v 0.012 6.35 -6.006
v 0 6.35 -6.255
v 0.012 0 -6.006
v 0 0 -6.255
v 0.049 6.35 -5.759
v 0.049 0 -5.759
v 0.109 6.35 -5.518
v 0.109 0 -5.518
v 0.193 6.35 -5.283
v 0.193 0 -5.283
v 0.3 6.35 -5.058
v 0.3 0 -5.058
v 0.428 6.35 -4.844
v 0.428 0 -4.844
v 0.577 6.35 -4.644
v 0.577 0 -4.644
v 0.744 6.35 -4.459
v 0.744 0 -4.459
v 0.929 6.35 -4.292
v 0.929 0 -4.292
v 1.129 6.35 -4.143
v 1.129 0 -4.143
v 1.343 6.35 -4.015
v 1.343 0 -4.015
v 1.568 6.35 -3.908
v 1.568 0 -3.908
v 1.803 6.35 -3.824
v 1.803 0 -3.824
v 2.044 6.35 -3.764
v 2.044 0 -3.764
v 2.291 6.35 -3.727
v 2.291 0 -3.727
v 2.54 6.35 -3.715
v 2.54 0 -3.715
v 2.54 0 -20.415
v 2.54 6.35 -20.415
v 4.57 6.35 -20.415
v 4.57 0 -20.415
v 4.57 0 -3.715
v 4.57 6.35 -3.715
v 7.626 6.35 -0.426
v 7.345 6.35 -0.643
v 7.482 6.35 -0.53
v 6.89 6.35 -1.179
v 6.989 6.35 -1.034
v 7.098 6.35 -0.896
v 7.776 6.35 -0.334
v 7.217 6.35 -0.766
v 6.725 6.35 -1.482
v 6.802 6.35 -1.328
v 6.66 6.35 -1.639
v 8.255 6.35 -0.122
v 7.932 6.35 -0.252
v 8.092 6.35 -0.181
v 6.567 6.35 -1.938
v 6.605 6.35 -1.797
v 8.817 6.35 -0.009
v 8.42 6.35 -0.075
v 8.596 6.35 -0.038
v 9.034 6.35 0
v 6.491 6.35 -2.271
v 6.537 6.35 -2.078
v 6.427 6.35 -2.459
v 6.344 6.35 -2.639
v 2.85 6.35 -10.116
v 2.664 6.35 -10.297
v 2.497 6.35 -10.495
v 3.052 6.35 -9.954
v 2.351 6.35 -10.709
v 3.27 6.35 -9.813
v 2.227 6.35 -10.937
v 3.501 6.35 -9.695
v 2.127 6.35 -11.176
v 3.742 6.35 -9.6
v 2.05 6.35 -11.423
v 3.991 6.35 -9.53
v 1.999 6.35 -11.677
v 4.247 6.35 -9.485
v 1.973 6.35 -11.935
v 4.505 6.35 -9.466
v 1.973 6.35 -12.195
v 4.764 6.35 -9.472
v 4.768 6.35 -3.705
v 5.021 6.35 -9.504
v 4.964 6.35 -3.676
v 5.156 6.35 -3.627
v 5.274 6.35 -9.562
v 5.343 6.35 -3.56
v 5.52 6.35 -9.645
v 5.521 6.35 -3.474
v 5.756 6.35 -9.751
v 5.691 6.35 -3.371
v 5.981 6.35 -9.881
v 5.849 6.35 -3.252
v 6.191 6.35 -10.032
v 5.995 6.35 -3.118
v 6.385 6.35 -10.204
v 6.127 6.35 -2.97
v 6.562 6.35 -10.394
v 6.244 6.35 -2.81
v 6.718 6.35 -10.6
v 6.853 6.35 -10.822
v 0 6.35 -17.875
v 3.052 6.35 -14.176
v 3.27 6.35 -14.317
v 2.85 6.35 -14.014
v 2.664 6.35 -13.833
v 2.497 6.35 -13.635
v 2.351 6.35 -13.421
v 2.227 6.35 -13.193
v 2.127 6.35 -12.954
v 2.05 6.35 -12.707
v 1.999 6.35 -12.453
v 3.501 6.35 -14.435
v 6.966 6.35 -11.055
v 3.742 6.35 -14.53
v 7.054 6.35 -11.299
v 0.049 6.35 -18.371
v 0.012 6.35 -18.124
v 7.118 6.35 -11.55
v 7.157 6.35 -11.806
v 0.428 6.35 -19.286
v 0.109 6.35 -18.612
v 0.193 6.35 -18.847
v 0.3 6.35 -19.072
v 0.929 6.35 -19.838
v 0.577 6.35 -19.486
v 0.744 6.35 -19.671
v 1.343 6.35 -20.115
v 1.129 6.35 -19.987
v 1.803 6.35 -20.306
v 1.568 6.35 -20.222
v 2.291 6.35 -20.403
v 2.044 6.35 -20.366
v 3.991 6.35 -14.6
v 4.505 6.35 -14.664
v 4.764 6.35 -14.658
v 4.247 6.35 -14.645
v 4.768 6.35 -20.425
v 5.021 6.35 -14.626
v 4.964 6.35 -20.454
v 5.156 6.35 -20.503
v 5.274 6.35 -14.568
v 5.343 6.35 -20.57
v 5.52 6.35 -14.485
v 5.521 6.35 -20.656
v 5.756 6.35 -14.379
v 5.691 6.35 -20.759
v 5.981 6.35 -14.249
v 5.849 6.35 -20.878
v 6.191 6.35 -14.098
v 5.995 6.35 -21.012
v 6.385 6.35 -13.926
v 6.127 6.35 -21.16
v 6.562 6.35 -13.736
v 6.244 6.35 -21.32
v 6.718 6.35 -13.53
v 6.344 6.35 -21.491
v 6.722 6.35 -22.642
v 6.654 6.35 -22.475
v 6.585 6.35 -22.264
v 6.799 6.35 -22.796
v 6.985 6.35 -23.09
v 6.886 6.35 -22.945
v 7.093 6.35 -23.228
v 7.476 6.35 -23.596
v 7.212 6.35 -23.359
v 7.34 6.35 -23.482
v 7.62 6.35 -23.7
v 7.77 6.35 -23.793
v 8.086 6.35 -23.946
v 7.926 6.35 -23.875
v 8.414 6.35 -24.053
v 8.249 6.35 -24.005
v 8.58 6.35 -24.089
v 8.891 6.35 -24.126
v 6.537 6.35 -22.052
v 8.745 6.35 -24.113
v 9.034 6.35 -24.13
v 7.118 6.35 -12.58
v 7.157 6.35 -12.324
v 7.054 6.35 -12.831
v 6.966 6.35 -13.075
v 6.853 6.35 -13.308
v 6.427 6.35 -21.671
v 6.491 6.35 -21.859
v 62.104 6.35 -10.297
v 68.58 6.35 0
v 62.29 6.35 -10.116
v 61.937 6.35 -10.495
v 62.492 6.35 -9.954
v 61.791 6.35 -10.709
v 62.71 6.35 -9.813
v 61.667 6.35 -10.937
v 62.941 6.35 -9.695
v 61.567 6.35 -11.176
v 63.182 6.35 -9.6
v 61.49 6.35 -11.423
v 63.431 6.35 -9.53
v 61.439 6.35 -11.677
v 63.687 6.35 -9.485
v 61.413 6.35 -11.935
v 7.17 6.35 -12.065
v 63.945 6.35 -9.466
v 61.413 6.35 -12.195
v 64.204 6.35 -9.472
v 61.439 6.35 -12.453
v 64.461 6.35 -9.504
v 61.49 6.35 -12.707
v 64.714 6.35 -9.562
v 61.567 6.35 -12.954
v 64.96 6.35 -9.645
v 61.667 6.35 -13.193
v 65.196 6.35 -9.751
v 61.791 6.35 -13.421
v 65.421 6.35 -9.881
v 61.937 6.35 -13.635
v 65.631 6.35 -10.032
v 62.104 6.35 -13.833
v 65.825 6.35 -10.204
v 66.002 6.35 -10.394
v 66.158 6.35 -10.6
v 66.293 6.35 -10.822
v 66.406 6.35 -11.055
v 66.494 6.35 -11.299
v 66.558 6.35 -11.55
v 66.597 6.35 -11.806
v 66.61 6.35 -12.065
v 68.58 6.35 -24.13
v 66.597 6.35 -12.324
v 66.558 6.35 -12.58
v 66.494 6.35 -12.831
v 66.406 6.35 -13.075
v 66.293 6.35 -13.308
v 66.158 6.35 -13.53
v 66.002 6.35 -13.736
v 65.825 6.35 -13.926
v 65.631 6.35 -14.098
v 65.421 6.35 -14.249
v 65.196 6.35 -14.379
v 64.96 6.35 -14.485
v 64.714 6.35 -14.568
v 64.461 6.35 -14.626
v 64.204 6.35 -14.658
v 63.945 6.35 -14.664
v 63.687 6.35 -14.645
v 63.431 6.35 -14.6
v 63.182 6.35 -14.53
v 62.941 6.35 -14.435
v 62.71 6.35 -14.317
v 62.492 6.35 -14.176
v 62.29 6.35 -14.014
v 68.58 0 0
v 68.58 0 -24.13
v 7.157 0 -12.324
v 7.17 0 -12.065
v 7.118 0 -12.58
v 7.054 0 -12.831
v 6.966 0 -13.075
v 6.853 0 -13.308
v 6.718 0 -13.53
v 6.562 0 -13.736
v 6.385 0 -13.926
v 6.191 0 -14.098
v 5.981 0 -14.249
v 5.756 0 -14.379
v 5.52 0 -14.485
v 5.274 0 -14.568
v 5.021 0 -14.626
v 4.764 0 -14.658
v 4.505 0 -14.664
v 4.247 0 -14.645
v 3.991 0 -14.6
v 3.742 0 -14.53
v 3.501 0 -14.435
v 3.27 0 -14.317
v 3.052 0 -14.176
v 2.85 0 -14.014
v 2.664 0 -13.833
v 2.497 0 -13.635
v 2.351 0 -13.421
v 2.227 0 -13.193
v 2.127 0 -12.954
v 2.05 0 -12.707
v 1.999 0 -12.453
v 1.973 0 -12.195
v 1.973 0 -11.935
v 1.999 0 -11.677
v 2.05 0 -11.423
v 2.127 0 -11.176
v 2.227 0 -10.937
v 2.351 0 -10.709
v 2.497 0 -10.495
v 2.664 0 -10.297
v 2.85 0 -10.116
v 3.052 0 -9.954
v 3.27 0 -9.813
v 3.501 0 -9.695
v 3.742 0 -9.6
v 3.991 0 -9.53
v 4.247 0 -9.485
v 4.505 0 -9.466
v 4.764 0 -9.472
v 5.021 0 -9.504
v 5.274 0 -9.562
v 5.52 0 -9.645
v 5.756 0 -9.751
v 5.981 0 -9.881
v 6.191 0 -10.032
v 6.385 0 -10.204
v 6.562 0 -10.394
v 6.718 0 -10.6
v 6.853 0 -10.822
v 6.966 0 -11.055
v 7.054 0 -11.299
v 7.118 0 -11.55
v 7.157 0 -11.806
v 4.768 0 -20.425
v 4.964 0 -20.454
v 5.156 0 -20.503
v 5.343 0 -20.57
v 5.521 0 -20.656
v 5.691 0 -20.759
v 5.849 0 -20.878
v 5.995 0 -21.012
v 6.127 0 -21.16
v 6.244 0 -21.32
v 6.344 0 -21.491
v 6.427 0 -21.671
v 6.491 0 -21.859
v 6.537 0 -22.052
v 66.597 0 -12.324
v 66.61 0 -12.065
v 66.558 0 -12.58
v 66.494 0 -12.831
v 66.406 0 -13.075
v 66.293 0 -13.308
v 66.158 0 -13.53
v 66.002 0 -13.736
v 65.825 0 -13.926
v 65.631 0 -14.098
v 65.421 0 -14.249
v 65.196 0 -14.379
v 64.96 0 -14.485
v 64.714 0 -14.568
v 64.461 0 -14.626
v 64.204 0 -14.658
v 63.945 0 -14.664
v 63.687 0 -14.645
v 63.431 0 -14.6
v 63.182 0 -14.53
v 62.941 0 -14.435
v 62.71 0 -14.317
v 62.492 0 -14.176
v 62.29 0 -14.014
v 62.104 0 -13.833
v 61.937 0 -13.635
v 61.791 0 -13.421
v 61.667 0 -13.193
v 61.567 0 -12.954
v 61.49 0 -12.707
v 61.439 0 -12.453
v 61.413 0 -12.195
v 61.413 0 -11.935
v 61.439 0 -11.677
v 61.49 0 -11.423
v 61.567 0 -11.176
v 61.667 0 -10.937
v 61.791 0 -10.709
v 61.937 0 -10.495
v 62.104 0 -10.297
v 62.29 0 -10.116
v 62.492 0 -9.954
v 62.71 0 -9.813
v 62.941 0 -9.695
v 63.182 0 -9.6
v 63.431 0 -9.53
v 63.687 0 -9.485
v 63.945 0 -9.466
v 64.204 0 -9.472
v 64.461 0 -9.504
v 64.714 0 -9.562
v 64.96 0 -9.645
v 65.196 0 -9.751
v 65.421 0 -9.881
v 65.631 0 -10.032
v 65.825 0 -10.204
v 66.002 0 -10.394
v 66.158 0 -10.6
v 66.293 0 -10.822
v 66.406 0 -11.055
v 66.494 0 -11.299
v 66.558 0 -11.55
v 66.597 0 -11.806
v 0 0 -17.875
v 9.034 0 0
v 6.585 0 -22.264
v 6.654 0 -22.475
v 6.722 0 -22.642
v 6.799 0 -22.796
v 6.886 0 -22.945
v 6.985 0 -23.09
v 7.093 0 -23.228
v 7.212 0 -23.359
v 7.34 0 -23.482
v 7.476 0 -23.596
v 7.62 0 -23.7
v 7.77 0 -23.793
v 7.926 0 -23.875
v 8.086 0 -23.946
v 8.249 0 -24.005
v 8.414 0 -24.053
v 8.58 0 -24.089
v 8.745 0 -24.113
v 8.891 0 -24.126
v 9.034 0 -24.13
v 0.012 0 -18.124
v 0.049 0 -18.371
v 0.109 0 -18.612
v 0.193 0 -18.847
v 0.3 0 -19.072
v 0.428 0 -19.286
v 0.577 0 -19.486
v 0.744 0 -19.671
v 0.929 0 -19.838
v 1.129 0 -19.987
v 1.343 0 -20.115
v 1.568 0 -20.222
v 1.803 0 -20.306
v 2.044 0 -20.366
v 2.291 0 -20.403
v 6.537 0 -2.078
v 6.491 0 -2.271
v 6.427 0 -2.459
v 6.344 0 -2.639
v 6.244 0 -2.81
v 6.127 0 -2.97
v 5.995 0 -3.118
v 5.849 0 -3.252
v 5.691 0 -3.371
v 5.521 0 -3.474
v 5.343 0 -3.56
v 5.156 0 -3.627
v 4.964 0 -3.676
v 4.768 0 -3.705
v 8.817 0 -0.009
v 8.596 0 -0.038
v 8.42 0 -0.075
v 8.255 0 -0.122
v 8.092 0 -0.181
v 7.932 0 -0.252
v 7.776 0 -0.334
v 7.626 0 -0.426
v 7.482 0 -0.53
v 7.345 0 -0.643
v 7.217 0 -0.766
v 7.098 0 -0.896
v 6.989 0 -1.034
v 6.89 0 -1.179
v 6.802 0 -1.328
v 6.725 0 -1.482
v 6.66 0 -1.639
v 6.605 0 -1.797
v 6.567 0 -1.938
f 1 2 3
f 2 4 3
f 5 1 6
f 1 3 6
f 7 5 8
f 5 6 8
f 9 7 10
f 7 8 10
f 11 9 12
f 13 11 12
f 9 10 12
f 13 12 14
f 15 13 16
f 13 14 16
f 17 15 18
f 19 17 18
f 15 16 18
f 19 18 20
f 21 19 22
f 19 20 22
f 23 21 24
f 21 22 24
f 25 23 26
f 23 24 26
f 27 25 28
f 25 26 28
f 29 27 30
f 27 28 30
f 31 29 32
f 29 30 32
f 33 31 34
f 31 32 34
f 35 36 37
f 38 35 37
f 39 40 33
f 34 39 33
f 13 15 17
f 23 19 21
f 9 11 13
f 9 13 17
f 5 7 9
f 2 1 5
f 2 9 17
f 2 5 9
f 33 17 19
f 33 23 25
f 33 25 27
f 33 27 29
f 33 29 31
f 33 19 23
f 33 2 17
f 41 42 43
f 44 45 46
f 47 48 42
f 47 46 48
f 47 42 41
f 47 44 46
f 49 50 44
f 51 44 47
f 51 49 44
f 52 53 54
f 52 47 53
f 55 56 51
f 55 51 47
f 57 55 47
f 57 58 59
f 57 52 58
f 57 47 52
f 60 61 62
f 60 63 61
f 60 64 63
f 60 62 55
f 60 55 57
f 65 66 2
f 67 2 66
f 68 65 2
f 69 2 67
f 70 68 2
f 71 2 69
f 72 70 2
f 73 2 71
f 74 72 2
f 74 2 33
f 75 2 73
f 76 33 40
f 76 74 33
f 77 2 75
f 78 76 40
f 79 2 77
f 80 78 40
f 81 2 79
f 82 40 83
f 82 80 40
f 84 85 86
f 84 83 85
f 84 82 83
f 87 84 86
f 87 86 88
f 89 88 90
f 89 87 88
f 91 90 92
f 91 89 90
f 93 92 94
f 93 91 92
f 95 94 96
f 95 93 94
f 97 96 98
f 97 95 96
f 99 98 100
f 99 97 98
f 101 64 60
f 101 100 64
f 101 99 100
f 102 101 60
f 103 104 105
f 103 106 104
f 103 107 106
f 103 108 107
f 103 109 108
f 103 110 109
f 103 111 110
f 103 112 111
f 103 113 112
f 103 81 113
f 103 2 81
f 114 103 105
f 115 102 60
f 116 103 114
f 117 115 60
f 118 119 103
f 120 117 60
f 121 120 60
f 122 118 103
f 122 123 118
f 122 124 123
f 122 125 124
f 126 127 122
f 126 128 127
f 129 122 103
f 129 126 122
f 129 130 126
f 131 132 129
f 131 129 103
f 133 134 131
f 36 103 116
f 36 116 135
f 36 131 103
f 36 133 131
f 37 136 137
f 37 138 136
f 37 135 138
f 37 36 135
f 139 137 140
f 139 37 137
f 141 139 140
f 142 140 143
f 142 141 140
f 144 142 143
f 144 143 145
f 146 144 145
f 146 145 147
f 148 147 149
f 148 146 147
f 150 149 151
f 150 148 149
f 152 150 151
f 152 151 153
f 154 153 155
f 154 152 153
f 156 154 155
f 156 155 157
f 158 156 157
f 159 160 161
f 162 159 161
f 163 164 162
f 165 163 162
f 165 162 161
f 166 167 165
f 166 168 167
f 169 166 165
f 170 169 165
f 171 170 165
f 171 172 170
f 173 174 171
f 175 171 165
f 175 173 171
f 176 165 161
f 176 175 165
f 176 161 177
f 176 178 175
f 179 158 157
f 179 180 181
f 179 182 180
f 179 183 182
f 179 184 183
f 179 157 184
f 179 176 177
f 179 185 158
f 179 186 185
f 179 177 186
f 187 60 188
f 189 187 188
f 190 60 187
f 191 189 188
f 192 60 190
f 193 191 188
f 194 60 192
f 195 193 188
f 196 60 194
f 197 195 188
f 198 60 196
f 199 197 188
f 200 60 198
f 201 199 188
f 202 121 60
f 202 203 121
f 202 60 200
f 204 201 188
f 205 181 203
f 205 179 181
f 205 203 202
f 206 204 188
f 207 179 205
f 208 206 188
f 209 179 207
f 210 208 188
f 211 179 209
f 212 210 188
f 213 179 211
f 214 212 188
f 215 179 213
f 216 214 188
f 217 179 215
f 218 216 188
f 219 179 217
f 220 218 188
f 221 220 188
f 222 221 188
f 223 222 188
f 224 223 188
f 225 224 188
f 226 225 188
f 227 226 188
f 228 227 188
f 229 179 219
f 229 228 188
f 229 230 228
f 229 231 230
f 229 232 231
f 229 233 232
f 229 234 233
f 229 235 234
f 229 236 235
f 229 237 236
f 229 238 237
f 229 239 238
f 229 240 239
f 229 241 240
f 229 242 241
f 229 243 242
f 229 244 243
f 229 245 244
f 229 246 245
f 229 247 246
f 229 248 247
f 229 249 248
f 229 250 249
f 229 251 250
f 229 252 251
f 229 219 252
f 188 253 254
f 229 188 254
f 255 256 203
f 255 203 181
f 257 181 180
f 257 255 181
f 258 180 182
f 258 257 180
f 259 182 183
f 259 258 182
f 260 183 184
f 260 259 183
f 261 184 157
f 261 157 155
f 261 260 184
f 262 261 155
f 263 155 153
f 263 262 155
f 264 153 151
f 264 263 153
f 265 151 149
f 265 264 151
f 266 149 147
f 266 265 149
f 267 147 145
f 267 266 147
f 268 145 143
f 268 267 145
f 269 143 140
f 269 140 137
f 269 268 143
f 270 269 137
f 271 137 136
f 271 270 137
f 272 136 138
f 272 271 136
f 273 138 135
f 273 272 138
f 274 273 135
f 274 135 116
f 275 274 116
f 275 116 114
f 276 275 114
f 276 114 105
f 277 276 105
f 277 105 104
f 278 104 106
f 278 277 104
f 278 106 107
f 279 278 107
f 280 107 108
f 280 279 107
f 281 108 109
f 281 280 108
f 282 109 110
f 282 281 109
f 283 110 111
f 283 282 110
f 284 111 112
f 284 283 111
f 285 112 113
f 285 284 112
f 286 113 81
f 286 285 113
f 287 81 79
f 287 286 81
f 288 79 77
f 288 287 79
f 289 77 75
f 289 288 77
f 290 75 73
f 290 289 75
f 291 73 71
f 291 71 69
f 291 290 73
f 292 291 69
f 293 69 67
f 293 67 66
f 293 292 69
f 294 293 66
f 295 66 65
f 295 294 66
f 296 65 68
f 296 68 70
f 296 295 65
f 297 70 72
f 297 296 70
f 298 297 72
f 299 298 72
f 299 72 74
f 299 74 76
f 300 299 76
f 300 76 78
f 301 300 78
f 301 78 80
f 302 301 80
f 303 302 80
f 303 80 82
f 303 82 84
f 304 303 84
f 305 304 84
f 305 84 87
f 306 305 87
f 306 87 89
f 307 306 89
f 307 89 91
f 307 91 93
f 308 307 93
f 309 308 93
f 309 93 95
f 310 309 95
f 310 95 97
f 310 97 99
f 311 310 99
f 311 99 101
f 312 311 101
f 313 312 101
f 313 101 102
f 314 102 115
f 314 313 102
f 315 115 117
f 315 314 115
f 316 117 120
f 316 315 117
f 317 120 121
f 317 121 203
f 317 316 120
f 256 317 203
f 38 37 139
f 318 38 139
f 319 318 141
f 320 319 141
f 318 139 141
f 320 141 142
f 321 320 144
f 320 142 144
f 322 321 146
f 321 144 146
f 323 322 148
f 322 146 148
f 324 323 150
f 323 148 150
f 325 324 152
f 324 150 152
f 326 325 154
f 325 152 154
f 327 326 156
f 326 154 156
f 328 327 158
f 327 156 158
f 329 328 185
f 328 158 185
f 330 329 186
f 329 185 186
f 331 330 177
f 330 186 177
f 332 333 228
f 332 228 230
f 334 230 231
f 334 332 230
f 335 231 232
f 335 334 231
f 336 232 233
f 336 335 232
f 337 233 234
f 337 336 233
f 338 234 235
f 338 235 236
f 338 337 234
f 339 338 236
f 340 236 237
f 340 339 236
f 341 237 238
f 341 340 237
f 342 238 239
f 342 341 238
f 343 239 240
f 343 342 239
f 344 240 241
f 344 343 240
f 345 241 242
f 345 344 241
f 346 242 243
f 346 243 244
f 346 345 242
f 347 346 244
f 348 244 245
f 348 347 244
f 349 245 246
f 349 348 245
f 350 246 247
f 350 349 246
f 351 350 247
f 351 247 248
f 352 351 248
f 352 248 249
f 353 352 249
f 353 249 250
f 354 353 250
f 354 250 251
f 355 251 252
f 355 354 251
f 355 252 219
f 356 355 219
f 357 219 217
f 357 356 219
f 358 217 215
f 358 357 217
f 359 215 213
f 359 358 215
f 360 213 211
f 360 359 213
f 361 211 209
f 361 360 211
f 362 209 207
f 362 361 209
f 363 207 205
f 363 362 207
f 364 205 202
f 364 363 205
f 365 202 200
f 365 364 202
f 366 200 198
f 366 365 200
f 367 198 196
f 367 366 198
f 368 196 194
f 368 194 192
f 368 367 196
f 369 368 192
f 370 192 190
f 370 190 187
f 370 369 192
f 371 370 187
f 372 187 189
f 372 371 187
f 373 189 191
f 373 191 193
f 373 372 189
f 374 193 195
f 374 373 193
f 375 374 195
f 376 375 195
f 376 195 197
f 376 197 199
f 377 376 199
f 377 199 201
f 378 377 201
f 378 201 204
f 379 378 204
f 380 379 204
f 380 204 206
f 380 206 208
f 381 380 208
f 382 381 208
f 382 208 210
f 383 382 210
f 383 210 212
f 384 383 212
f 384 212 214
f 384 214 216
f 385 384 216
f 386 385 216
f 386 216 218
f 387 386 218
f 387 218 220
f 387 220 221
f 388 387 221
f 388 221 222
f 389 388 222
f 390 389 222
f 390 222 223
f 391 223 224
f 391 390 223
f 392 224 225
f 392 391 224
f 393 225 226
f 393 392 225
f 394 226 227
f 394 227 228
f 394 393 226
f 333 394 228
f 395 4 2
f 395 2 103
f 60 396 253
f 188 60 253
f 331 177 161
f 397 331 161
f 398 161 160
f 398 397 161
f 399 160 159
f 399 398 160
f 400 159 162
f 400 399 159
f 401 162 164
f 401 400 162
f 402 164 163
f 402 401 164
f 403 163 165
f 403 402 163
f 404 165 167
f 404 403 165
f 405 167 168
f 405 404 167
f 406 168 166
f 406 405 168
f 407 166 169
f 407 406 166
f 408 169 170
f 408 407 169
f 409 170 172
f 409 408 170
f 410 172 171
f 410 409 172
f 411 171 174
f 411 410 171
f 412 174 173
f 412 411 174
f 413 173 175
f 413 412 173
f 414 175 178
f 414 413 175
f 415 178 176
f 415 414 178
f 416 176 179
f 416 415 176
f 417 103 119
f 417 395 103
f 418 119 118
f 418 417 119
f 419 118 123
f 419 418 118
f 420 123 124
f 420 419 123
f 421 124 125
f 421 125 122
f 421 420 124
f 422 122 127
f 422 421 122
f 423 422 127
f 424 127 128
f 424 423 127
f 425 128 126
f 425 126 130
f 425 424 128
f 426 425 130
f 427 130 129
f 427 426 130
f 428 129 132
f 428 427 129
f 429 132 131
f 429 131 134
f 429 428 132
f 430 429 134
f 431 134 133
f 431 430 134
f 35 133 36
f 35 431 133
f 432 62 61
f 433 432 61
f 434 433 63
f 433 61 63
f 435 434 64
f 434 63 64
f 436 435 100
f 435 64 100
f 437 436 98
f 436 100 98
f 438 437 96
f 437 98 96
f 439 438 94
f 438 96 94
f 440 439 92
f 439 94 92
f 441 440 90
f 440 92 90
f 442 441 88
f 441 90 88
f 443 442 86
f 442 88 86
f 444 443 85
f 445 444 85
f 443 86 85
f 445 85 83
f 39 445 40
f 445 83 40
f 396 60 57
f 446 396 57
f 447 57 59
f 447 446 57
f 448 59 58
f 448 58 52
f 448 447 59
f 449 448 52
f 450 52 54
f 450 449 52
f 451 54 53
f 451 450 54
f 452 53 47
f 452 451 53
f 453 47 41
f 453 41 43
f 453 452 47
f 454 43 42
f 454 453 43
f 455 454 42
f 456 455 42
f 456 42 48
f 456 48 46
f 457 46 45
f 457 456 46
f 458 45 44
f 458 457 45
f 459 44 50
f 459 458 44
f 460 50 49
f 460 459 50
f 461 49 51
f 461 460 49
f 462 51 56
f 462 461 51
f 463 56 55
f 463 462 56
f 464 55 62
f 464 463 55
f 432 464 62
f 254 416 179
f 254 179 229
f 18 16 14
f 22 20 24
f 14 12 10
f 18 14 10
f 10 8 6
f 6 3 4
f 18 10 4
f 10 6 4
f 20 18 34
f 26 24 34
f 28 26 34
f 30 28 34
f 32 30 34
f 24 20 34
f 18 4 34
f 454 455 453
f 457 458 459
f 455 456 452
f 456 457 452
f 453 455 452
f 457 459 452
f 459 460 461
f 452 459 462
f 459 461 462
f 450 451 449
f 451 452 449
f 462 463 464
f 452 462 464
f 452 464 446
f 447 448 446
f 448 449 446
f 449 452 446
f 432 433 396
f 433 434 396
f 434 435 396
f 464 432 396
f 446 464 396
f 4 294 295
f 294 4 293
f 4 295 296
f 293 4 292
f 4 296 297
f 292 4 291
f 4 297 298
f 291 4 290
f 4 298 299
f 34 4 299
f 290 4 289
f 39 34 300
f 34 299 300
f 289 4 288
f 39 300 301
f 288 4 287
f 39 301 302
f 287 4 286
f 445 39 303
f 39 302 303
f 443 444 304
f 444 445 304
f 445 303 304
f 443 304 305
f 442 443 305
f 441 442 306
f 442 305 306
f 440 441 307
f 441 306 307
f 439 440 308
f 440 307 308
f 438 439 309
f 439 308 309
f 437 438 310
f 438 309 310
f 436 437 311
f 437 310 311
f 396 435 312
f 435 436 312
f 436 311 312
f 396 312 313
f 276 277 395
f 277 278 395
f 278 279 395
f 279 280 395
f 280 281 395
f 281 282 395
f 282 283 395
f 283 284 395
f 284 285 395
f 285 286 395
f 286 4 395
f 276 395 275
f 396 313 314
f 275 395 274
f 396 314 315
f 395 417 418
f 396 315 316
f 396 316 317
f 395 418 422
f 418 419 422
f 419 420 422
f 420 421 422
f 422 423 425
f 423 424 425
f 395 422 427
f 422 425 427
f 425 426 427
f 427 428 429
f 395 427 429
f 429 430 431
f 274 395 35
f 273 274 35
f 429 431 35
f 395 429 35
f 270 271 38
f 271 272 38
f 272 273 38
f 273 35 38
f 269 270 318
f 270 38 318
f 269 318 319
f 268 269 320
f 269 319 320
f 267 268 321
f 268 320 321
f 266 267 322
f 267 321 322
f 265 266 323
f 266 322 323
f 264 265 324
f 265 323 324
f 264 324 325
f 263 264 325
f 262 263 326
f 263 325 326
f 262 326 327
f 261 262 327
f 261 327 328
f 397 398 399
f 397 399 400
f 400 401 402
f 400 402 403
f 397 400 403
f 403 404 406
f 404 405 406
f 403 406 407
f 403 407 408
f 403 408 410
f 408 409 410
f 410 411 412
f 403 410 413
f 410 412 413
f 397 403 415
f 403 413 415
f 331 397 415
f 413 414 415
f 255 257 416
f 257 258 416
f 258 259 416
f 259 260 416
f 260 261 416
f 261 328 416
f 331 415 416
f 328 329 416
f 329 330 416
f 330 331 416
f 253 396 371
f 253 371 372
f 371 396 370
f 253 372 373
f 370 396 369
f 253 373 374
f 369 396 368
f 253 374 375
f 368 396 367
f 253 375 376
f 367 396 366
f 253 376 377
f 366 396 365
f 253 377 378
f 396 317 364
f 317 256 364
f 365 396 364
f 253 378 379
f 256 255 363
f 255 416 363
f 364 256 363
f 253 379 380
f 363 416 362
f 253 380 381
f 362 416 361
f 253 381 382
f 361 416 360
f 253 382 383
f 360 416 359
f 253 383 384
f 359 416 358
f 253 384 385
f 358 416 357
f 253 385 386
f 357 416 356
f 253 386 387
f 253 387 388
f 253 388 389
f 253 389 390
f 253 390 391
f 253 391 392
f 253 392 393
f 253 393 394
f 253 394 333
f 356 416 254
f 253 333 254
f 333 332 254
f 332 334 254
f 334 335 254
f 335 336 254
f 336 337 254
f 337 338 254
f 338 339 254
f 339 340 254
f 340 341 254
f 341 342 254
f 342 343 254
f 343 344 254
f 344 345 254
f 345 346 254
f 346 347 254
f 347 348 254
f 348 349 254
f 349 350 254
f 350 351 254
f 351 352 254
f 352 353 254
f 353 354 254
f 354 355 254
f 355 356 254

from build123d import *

# Parameters (mm, degrees)
SKETCH2_W           = 68.58
SKETCH2_H           = 24.13
SKETCH2_R           = 2.6
BOSS_EXTRUDE1_DEPTH = 6.35
CUT_EXTRUDE1_DEPTH  = 7.35
FILLET3_R           = 2.54


with BuildPart() as part:
    # Sketch2 → Boss-Extrude1 (new body)
    with BuildSketch(Plane(origin=(0, 0, 0), x_dir=(1, 0, 0), z_dir=(0, 1, 0))):
        with Locations((34.29, 12.065)):
            Rectangle(SKETCH2_W, SKETCH2_H)
        with Locations((4.57, 12.065)):
            Circle(SKETCH2_R, mode=Mode.SUBTRACT)
        with Locations((64.01, 12.065)):
            Circle(SKETCH2_R, mode=Mode.SUBTRACT)
    extrude(amount=BOSS_EXTRUDE1_DEPTH)

    # Sketch3 → Cut-Extrude1 (cut, through all)
    with BuildSketch(Plane(origin=(0, 6.35, 0), x_dir=(1, 0, 0), z_dir=(0, 1, 0))):
        with BuildLine():
            Line((4.57, 3.715), (0, 3.715))
            Line((0, 3.715), (0, 0))
            Line((0, 0), (6.57, 0))
            Line((6.57, 0), (6.57, 1.715))
            ThreePointArc((6.57, 1.715), (5.984213562, 3.129213562), (4.57, 3.715))
        make_face()
        with BuildLine():
            ThreePointArc((4.57, 20.415), (5.984213562, 21.000786438), (6.57, 22.415))
            Line((6.57, 22.415), (6.57, 24.13))
            Line((6.57, 24.13), (0, 24.13))
            Line((0, 24.13), (0, 20.415))
            Line((0, 20.415), (4.57, 20.415))
        make_face()
    extrude(amount=-CUT_EXTRUDE1_DEPTH, mode=Mode.SUBTRACT)

    # Fillet3
    fillet3_edges = [part.edges().sort_by_distance(p)[0] for p in [
        (6.57, 3.175, 0),
        (0, 3.175, -3.715),
        (0, 3.175, -20.415),
        (6.57, 3.175, -24.13),
    ]]
    fillet(fillet3_edges, radius=FILLET3_R)


solid = part.part
